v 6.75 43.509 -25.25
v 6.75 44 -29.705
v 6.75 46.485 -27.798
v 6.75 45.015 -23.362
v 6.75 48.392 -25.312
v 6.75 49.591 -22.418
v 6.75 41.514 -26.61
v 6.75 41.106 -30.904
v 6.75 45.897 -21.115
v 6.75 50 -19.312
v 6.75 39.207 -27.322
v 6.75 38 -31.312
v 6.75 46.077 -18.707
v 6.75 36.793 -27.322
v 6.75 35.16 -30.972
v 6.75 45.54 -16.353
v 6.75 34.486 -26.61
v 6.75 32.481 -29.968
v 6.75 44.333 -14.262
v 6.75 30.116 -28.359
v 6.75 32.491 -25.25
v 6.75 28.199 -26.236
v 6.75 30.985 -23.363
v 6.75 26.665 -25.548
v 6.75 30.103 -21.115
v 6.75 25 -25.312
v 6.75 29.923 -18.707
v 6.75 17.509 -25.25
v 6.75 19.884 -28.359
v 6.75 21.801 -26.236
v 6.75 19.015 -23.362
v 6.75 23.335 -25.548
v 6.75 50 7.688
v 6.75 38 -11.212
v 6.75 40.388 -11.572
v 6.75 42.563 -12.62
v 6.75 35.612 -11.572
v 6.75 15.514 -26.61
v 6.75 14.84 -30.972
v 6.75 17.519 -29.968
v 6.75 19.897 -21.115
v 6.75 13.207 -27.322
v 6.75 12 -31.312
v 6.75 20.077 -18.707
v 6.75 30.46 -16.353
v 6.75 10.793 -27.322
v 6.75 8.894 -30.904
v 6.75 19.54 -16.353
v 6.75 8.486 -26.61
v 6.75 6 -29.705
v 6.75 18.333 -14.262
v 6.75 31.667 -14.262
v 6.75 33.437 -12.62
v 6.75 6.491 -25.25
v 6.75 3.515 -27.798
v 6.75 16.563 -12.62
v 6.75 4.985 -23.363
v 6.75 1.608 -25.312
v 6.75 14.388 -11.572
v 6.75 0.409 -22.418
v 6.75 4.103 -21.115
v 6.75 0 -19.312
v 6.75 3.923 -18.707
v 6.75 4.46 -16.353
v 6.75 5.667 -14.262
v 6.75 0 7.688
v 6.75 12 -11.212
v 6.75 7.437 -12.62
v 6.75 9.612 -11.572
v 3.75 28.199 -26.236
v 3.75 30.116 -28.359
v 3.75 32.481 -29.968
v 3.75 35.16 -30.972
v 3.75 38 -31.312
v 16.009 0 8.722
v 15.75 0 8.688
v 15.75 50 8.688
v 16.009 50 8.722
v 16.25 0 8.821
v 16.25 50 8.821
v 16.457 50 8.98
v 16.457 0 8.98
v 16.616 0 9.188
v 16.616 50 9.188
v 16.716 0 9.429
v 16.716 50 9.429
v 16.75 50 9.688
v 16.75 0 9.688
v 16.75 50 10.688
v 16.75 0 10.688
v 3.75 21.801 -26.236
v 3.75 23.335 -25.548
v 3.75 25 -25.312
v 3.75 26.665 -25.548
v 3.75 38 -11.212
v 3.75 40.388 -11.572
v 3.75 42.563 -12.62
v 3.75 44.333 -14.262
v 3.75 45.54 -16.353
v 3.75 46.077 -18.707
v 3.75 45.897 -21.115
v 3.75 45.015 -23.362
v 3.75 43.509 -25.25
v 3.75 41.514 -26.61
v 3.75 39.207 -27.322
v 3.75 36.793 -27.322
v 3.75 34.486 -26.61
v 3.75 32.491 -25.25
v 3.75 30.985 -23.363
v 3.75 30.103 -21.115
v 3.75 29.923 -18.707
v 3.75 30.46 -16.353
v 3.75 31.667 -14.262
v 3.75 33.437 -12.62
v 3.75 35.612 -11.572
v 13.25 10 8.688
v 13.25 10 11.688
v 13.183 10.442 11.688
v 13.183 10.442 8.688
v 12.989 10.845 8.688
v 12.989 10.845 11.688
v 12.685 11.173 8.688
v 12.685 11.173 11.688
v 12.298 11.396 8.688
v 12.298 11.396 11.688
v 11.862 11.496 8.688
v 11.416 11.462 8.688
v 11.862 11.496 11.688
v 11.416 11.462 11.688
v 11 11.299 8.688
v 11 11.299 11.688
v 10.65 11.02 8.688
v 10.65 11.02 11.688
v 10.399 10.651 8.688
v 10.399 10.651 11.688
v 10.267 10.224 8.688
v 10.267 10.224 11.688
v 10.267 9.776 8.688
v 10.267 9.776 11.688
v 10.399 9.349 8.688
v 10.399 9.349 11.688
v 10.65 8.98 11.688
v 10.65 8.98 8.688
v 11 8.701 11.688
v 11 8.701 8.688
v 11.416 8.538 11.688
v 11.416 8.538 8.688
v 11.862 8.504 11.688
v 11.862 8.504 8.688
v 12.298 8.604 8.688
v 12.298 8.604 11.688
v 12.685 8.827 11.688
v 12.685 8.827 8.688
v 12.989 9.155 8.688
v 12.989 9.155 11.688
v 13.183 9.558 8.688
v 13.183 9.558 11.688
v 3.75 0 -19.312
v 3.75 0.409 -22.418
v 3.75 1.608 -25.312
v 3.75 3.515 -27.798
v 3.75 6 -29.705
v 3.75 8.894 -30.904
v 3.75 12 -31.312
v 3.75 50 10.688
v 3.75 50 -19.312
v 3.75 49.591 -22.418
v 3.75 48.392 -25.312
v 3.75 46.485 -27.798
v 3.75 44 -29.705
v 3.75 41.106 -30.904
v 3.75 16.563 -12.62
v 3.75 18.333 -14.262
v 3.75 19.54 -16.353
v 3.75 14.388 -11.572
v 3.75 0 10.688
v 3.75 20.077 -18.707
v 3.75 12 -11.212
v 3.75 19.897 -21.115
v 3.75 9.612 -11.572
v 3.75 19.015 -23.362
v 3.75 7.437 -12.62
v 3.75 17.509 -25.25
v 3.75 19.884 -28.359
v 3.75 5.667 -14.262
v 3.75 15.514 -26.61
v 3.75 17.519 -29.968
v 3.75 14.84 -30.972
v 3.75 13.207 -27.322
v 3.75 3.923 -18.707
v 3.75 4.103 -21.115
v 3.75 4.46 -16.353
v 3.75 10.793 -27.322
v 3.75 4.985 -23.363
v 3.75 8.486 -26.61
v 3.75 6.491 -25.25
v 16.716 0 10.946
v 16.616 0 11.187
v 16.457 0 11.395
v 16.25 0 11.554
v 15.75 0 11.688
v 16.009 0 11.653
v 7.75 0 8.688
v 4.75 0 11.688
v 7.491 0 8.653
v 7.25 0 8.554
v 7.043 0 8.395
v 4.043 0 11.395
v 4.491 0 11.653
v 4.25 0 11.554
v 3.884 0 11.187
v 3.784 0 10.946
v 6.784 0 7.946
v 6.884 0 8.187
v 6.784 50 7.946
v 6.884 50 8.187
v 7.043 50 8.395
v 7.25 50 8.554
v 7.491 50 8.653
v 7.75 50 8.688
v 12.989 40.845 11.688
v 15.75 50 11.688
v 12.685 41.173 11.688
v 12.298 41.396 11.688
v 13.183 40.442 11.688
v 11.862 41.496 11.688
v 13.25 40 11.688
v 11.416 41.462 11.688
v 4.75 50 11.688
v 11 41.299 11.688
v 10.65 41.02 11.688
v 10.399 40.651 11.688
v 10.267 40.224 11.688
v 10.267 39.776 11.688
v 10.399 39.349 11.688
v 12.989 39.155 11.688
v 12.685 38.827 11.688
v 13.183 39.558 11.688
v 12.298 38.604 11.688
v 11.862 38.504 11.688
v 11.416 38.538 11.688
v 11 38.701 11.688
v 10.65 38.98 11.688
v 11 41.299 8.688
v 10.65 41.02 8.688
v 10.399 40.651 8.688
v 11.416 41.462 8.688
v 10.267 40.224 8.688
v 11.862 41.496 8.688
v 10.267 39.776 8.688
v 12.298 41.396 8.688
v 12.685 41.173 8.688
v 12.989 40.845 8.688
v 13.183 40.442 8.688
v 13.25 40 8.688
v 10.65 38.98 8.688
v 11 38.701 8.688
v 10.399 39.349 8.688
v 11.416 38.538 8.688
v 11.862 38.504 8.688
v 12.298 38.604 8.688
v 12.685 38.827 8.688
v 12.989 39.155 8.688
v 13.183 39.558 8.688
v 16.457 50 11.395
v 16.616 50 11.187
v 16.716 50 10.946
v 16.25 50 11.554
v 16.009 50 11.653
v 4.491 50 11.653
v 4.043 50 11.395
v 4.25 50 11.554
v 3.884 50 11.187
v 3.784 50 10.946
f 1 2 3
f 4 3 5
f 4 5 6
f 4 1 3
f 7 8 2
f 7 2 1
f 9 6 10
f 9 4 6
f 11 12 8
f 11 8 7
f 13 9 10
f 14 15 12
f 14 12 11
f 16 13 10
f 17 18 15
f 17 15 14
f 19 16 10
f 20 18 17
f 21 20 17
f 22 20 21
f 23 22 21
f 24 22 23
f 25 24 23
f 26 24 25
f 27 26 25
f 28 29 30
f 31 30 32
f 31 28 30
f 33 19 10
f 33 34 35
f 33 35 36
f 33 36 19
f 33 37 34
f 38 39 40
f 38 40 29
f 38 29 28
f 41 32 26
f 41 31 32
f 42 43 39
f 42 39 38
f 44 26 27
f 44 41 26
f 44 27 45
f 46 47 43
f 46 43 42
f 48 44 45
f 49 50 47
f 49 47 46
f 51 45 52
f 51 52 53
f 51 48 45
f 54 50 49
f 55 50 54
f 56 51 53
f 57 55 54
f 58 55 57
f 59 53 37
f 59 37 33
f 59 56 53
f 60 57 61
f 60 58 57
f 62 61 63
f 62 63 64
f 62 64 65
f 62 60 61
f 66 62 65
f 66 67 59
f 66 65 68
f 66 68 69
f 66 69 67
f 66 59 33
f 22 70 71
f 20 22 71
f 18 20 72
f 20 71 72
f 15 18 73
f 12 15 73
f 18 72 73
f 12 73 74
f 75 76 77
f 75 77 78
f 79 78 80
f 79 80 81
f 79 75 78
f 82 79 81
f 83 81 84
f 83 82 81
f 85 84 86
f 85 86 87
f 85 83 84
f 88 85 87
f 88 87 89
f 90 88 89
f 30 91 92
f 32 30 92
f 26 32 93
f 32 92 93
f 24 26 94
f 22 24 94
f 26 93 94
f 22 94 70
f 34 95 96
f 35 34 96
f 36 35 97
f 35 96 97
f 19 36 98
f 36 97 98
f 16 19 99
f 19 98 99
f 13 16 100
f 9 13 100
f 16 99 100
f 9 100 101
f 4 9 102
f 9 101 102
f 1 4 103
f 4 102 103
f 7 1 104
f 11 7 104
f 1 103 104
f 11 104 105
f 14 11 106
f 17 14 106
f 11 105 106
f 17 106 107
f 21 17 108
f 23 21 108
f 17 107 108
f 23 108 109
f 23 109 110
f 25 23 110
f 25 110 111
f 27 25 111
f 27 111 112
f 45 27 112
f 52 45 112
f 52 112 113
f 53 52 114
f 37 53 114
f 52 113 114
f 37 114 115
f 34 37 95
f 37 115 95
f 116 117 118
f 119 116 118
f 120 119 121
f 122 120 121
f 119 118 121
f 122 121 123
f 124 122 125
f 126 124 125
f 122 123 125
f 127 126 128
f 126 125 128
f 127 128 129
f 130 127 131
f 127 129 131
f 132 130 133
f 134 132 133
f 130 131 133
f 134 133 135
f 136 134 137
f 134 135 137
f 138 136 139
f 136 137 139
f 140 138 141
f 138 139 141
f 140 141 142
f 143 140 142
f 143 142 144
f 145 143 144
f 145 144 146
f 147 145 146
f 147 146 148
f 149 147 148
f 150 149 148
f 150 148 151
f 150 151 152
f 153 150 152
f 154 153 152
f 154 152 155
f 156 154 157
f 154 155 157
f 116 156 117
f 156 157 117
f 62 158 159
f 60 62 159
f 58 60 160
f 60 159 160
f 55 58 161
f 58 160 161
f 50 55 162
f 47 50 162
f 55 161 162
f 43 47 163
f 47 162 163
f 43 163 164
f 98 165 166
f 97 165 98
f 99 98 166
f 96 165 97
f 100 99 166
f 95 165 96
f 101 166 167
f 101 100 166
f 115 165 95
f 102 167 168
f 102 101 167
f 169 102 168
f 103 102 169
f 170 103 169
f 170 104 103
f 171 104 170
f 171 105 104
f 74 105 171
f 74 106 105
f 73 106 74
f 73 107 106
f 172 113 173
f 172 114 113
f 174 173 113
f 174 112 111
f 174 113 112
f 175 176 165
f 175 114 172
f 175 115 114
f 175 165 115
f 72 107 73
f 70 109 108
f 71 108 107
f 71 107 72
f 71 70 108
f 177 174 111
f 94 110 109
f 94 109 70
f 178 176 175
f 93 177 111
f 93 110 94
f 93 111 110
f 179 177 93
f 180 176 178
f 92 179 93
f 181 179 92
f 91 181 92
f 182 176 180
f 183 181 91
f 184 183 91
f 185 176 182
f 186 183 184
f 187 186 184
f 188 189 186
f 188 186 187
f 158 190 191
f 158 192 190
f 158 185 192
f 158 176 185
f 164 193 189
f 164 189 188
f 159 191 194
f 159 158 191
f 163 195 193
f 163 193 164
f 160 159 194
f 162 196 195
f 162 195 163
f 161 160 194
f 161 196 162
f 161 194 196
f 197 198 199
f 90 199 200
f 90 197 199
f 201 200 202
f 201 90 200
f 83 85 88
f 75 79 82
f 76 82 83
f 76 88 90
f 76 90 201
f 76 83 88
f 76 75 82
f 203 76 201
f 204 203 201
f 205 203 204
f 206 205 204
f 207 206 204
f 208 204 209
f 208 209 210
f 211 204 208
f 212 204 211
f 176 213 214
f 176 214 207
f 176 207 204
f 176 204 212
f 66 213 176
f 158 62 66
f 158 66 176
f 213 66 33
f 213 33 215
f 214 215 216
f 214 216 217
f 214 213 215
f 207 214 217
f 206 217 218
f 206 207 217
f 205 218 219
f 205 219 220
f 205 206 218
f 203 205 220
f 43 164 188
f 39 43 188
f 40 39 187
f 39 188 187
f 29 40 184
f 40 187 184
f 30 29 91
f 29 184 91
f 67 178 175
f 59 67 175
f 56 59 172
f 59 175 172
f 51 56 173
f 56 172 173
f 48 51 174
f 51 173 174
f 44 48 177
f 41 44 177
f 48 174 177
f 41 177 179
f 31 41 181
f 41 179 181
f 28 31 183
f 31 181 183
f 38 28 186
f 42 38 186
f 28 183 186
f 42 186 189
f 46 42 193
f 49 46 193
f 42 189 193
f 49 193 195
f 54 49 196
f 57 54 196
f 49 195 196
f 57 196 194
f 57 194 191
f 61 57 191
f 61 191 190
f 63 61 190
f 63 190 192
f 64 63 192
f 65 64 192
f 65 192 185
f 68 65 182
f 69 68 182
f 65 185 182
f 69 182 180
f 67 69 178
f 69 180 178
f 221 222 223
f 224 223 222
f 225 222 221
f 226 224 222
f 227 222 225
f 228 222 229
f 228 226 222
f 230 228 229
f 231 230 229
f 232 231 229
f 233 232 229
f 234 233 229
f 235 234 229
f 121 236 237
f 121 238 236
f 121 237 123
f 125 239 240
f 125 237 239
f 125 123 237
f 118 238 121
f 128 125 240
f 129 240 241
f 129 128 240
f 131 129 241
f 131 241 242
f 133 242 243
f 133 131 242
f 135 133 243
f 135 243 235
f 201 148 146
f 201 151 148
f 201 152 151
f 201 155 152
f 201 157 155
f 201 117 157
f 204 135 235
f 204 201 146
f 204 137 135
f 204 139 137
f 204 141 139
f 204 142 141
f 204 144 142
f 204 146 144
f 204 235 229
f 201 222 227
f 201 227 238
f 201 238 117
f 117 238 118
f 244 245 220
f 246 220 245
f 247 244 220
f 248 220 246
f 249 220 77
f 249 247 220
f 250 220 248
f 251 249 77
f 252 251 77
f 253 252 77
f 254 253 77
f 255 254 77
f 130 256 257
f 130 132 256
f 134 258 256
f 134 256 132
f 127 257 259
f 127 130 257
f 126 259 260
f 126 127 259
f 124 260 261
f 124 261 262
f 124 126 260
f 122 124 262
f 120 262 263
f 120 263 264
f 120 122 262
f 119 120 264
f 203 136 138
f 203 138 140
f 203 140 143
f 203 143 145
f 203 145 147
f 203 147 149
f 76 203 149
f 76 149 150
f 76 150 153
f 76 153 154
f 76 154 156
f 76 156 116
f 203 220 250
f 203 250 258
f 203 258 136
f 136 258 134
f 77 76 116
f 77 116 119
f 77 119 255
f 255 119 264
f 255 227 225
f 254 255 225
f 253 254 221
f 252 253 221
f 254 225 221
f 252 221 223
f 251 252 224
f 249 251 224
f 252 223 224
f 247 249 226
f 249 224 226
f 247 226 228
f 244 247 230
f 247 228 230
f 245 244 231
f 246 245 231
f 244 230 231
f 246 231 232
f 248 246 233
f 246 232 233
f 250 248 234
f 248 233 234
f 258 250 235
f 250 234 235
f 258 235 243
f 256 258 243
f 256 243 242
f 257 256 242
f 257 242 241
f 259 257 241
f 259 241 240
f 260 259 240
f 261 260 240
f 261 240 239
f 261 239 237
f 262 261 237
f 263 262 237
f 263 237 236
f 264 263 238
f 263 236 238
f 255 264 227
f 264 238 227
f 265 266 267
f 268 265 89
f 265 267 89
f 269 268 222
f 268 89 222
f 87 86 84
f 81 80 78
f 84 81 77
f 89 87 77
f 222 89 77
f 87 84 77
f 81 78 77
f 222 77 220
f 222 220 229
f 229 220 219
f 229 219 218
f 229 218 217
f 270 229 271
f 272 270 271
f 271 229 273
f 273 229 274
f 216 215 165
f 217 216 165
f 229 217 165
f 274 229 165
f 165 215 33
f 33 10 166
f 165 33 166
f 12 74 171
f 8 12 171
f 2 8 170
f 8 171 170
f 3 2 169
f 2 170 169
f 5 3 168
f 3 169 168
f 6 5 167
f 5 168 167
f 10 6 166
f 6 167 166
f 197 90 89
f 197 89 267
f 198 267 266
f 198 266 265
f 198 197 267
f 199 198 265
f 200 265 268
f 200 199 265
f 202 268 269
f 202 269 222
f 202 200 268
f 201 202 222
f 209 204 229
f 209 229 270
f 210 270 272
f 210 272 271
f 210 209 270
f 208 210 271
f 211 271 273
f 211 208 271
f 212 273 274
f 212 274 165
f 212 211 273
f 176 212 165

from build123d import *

# Parameters (mm, degrees)
BOSS_EXTRUDE1_DEPTH = 50
SKETCH2_R           = 1.5
CUT_EXTRUDE1_DEPTH  = 3
SKETCH3_R           = 8.1
CUT_EXTRUDE2_DEPTH  = 3


with BuildPart() as part:
    # Sketch1 → Boss-Extrude1 (new body)
    with BuildSketch(Plane(origin=(0, 0, 0), x_dir=(1, 0, 0), z_dir=(0, 1, 0))):
        with BuildLine():
            Line((3.75, 31.3125), (6.75, 31.3125))
            Line((6.75, 31.3125), (6.75, -7.6875))
            ThreePointArc((6.75, -7.6875), (7.042893219, -8.394606781), (7.75, -8.6875))
            Line((7.75, -8.6875), (15.75, -8.6875))
            ThreePointArc((15.75, -8.6875), (16.457106781, -8.980393219), (16.75, -9.6875))
            Line((16.75, -9.6875), (16.75, -10.6875))
            ThreePointArc((16.75, -10.6875), (16.457106781, -11.394606781), (15.75, -11.6875))
            Line((15.75, -11.6875), (4.75, -11.6875))
            ThreePointArc((4.75, -11.6875), (4.042893219, -11.394606781), (3.75, -10.6875))
            Line((3.75, -10.6875), (3.75, 31.3125))
        make_face()
    extrude(amount=BOSS_EXTRUDE1_DEPTH)

    # Sketch2 → Cut-Extrude1 (cut)
    with BuildSketch(Plane.XY.offset(11.6875)):
        with Locations((11.75, 40)):
            Circle(SKETCH2_R)
        with Locations((11.75, 10)):
            Circle(SKETCH2_R)
    extrude(amount=-CUT_EXTRUDE1_DEPTH, mode=Mode.SUBTRACT)

    # Sketch3 → Cut-Extrude2 (cut)
    with BuildSketch(Plane.ZY.offset(-3.75)):
        with BuildLine():
            Line((-31.3125, 0), (-19.3125, 0))
            ThreePointArc((-19.3125, 0), (-27.797781374, 3.514718626), (-31.3125, 12))
            Line((-31.3125, 12), (-31.3125, 0))
        make_face()
        with BuildLine():
            Line((-31.3125, 38), (-31.3125, 12))
            ThreePointArc((-31.3125, 12), (-29.968194023, 17.518712249), (-26.236469186, 21.800951521))
            ThreePointArc((-26.236469186, 21.800951521), (-25.3125, 25), (-26.236469186, 28.199048479))
            ThreePointArc((-26.236469186, 28.199048479), (-29.968194023, 32.481287751), (-31.3125, 38))
        make_face()
        with BuildLine():
            Line((-31.3125, 50), (-31.3125, 38))
            ThreePointArc((-31.3125, 38), (-27.797781374, 46.485281374), (-19.3125, 50))
            Line((-19.3125, 50), (-31.3125, 50))
        make_face()
        with Locations((-19.3125, 12)):
            Circle(SKETCH3_R)
        with Locations((-19.3125, 38)):
            Circle(SKETCH3_R)
    extrude(amount=-CUT_EXTRUDE2_DEPTH, mode=Mode.SUBTRACT)


solid = part.part
